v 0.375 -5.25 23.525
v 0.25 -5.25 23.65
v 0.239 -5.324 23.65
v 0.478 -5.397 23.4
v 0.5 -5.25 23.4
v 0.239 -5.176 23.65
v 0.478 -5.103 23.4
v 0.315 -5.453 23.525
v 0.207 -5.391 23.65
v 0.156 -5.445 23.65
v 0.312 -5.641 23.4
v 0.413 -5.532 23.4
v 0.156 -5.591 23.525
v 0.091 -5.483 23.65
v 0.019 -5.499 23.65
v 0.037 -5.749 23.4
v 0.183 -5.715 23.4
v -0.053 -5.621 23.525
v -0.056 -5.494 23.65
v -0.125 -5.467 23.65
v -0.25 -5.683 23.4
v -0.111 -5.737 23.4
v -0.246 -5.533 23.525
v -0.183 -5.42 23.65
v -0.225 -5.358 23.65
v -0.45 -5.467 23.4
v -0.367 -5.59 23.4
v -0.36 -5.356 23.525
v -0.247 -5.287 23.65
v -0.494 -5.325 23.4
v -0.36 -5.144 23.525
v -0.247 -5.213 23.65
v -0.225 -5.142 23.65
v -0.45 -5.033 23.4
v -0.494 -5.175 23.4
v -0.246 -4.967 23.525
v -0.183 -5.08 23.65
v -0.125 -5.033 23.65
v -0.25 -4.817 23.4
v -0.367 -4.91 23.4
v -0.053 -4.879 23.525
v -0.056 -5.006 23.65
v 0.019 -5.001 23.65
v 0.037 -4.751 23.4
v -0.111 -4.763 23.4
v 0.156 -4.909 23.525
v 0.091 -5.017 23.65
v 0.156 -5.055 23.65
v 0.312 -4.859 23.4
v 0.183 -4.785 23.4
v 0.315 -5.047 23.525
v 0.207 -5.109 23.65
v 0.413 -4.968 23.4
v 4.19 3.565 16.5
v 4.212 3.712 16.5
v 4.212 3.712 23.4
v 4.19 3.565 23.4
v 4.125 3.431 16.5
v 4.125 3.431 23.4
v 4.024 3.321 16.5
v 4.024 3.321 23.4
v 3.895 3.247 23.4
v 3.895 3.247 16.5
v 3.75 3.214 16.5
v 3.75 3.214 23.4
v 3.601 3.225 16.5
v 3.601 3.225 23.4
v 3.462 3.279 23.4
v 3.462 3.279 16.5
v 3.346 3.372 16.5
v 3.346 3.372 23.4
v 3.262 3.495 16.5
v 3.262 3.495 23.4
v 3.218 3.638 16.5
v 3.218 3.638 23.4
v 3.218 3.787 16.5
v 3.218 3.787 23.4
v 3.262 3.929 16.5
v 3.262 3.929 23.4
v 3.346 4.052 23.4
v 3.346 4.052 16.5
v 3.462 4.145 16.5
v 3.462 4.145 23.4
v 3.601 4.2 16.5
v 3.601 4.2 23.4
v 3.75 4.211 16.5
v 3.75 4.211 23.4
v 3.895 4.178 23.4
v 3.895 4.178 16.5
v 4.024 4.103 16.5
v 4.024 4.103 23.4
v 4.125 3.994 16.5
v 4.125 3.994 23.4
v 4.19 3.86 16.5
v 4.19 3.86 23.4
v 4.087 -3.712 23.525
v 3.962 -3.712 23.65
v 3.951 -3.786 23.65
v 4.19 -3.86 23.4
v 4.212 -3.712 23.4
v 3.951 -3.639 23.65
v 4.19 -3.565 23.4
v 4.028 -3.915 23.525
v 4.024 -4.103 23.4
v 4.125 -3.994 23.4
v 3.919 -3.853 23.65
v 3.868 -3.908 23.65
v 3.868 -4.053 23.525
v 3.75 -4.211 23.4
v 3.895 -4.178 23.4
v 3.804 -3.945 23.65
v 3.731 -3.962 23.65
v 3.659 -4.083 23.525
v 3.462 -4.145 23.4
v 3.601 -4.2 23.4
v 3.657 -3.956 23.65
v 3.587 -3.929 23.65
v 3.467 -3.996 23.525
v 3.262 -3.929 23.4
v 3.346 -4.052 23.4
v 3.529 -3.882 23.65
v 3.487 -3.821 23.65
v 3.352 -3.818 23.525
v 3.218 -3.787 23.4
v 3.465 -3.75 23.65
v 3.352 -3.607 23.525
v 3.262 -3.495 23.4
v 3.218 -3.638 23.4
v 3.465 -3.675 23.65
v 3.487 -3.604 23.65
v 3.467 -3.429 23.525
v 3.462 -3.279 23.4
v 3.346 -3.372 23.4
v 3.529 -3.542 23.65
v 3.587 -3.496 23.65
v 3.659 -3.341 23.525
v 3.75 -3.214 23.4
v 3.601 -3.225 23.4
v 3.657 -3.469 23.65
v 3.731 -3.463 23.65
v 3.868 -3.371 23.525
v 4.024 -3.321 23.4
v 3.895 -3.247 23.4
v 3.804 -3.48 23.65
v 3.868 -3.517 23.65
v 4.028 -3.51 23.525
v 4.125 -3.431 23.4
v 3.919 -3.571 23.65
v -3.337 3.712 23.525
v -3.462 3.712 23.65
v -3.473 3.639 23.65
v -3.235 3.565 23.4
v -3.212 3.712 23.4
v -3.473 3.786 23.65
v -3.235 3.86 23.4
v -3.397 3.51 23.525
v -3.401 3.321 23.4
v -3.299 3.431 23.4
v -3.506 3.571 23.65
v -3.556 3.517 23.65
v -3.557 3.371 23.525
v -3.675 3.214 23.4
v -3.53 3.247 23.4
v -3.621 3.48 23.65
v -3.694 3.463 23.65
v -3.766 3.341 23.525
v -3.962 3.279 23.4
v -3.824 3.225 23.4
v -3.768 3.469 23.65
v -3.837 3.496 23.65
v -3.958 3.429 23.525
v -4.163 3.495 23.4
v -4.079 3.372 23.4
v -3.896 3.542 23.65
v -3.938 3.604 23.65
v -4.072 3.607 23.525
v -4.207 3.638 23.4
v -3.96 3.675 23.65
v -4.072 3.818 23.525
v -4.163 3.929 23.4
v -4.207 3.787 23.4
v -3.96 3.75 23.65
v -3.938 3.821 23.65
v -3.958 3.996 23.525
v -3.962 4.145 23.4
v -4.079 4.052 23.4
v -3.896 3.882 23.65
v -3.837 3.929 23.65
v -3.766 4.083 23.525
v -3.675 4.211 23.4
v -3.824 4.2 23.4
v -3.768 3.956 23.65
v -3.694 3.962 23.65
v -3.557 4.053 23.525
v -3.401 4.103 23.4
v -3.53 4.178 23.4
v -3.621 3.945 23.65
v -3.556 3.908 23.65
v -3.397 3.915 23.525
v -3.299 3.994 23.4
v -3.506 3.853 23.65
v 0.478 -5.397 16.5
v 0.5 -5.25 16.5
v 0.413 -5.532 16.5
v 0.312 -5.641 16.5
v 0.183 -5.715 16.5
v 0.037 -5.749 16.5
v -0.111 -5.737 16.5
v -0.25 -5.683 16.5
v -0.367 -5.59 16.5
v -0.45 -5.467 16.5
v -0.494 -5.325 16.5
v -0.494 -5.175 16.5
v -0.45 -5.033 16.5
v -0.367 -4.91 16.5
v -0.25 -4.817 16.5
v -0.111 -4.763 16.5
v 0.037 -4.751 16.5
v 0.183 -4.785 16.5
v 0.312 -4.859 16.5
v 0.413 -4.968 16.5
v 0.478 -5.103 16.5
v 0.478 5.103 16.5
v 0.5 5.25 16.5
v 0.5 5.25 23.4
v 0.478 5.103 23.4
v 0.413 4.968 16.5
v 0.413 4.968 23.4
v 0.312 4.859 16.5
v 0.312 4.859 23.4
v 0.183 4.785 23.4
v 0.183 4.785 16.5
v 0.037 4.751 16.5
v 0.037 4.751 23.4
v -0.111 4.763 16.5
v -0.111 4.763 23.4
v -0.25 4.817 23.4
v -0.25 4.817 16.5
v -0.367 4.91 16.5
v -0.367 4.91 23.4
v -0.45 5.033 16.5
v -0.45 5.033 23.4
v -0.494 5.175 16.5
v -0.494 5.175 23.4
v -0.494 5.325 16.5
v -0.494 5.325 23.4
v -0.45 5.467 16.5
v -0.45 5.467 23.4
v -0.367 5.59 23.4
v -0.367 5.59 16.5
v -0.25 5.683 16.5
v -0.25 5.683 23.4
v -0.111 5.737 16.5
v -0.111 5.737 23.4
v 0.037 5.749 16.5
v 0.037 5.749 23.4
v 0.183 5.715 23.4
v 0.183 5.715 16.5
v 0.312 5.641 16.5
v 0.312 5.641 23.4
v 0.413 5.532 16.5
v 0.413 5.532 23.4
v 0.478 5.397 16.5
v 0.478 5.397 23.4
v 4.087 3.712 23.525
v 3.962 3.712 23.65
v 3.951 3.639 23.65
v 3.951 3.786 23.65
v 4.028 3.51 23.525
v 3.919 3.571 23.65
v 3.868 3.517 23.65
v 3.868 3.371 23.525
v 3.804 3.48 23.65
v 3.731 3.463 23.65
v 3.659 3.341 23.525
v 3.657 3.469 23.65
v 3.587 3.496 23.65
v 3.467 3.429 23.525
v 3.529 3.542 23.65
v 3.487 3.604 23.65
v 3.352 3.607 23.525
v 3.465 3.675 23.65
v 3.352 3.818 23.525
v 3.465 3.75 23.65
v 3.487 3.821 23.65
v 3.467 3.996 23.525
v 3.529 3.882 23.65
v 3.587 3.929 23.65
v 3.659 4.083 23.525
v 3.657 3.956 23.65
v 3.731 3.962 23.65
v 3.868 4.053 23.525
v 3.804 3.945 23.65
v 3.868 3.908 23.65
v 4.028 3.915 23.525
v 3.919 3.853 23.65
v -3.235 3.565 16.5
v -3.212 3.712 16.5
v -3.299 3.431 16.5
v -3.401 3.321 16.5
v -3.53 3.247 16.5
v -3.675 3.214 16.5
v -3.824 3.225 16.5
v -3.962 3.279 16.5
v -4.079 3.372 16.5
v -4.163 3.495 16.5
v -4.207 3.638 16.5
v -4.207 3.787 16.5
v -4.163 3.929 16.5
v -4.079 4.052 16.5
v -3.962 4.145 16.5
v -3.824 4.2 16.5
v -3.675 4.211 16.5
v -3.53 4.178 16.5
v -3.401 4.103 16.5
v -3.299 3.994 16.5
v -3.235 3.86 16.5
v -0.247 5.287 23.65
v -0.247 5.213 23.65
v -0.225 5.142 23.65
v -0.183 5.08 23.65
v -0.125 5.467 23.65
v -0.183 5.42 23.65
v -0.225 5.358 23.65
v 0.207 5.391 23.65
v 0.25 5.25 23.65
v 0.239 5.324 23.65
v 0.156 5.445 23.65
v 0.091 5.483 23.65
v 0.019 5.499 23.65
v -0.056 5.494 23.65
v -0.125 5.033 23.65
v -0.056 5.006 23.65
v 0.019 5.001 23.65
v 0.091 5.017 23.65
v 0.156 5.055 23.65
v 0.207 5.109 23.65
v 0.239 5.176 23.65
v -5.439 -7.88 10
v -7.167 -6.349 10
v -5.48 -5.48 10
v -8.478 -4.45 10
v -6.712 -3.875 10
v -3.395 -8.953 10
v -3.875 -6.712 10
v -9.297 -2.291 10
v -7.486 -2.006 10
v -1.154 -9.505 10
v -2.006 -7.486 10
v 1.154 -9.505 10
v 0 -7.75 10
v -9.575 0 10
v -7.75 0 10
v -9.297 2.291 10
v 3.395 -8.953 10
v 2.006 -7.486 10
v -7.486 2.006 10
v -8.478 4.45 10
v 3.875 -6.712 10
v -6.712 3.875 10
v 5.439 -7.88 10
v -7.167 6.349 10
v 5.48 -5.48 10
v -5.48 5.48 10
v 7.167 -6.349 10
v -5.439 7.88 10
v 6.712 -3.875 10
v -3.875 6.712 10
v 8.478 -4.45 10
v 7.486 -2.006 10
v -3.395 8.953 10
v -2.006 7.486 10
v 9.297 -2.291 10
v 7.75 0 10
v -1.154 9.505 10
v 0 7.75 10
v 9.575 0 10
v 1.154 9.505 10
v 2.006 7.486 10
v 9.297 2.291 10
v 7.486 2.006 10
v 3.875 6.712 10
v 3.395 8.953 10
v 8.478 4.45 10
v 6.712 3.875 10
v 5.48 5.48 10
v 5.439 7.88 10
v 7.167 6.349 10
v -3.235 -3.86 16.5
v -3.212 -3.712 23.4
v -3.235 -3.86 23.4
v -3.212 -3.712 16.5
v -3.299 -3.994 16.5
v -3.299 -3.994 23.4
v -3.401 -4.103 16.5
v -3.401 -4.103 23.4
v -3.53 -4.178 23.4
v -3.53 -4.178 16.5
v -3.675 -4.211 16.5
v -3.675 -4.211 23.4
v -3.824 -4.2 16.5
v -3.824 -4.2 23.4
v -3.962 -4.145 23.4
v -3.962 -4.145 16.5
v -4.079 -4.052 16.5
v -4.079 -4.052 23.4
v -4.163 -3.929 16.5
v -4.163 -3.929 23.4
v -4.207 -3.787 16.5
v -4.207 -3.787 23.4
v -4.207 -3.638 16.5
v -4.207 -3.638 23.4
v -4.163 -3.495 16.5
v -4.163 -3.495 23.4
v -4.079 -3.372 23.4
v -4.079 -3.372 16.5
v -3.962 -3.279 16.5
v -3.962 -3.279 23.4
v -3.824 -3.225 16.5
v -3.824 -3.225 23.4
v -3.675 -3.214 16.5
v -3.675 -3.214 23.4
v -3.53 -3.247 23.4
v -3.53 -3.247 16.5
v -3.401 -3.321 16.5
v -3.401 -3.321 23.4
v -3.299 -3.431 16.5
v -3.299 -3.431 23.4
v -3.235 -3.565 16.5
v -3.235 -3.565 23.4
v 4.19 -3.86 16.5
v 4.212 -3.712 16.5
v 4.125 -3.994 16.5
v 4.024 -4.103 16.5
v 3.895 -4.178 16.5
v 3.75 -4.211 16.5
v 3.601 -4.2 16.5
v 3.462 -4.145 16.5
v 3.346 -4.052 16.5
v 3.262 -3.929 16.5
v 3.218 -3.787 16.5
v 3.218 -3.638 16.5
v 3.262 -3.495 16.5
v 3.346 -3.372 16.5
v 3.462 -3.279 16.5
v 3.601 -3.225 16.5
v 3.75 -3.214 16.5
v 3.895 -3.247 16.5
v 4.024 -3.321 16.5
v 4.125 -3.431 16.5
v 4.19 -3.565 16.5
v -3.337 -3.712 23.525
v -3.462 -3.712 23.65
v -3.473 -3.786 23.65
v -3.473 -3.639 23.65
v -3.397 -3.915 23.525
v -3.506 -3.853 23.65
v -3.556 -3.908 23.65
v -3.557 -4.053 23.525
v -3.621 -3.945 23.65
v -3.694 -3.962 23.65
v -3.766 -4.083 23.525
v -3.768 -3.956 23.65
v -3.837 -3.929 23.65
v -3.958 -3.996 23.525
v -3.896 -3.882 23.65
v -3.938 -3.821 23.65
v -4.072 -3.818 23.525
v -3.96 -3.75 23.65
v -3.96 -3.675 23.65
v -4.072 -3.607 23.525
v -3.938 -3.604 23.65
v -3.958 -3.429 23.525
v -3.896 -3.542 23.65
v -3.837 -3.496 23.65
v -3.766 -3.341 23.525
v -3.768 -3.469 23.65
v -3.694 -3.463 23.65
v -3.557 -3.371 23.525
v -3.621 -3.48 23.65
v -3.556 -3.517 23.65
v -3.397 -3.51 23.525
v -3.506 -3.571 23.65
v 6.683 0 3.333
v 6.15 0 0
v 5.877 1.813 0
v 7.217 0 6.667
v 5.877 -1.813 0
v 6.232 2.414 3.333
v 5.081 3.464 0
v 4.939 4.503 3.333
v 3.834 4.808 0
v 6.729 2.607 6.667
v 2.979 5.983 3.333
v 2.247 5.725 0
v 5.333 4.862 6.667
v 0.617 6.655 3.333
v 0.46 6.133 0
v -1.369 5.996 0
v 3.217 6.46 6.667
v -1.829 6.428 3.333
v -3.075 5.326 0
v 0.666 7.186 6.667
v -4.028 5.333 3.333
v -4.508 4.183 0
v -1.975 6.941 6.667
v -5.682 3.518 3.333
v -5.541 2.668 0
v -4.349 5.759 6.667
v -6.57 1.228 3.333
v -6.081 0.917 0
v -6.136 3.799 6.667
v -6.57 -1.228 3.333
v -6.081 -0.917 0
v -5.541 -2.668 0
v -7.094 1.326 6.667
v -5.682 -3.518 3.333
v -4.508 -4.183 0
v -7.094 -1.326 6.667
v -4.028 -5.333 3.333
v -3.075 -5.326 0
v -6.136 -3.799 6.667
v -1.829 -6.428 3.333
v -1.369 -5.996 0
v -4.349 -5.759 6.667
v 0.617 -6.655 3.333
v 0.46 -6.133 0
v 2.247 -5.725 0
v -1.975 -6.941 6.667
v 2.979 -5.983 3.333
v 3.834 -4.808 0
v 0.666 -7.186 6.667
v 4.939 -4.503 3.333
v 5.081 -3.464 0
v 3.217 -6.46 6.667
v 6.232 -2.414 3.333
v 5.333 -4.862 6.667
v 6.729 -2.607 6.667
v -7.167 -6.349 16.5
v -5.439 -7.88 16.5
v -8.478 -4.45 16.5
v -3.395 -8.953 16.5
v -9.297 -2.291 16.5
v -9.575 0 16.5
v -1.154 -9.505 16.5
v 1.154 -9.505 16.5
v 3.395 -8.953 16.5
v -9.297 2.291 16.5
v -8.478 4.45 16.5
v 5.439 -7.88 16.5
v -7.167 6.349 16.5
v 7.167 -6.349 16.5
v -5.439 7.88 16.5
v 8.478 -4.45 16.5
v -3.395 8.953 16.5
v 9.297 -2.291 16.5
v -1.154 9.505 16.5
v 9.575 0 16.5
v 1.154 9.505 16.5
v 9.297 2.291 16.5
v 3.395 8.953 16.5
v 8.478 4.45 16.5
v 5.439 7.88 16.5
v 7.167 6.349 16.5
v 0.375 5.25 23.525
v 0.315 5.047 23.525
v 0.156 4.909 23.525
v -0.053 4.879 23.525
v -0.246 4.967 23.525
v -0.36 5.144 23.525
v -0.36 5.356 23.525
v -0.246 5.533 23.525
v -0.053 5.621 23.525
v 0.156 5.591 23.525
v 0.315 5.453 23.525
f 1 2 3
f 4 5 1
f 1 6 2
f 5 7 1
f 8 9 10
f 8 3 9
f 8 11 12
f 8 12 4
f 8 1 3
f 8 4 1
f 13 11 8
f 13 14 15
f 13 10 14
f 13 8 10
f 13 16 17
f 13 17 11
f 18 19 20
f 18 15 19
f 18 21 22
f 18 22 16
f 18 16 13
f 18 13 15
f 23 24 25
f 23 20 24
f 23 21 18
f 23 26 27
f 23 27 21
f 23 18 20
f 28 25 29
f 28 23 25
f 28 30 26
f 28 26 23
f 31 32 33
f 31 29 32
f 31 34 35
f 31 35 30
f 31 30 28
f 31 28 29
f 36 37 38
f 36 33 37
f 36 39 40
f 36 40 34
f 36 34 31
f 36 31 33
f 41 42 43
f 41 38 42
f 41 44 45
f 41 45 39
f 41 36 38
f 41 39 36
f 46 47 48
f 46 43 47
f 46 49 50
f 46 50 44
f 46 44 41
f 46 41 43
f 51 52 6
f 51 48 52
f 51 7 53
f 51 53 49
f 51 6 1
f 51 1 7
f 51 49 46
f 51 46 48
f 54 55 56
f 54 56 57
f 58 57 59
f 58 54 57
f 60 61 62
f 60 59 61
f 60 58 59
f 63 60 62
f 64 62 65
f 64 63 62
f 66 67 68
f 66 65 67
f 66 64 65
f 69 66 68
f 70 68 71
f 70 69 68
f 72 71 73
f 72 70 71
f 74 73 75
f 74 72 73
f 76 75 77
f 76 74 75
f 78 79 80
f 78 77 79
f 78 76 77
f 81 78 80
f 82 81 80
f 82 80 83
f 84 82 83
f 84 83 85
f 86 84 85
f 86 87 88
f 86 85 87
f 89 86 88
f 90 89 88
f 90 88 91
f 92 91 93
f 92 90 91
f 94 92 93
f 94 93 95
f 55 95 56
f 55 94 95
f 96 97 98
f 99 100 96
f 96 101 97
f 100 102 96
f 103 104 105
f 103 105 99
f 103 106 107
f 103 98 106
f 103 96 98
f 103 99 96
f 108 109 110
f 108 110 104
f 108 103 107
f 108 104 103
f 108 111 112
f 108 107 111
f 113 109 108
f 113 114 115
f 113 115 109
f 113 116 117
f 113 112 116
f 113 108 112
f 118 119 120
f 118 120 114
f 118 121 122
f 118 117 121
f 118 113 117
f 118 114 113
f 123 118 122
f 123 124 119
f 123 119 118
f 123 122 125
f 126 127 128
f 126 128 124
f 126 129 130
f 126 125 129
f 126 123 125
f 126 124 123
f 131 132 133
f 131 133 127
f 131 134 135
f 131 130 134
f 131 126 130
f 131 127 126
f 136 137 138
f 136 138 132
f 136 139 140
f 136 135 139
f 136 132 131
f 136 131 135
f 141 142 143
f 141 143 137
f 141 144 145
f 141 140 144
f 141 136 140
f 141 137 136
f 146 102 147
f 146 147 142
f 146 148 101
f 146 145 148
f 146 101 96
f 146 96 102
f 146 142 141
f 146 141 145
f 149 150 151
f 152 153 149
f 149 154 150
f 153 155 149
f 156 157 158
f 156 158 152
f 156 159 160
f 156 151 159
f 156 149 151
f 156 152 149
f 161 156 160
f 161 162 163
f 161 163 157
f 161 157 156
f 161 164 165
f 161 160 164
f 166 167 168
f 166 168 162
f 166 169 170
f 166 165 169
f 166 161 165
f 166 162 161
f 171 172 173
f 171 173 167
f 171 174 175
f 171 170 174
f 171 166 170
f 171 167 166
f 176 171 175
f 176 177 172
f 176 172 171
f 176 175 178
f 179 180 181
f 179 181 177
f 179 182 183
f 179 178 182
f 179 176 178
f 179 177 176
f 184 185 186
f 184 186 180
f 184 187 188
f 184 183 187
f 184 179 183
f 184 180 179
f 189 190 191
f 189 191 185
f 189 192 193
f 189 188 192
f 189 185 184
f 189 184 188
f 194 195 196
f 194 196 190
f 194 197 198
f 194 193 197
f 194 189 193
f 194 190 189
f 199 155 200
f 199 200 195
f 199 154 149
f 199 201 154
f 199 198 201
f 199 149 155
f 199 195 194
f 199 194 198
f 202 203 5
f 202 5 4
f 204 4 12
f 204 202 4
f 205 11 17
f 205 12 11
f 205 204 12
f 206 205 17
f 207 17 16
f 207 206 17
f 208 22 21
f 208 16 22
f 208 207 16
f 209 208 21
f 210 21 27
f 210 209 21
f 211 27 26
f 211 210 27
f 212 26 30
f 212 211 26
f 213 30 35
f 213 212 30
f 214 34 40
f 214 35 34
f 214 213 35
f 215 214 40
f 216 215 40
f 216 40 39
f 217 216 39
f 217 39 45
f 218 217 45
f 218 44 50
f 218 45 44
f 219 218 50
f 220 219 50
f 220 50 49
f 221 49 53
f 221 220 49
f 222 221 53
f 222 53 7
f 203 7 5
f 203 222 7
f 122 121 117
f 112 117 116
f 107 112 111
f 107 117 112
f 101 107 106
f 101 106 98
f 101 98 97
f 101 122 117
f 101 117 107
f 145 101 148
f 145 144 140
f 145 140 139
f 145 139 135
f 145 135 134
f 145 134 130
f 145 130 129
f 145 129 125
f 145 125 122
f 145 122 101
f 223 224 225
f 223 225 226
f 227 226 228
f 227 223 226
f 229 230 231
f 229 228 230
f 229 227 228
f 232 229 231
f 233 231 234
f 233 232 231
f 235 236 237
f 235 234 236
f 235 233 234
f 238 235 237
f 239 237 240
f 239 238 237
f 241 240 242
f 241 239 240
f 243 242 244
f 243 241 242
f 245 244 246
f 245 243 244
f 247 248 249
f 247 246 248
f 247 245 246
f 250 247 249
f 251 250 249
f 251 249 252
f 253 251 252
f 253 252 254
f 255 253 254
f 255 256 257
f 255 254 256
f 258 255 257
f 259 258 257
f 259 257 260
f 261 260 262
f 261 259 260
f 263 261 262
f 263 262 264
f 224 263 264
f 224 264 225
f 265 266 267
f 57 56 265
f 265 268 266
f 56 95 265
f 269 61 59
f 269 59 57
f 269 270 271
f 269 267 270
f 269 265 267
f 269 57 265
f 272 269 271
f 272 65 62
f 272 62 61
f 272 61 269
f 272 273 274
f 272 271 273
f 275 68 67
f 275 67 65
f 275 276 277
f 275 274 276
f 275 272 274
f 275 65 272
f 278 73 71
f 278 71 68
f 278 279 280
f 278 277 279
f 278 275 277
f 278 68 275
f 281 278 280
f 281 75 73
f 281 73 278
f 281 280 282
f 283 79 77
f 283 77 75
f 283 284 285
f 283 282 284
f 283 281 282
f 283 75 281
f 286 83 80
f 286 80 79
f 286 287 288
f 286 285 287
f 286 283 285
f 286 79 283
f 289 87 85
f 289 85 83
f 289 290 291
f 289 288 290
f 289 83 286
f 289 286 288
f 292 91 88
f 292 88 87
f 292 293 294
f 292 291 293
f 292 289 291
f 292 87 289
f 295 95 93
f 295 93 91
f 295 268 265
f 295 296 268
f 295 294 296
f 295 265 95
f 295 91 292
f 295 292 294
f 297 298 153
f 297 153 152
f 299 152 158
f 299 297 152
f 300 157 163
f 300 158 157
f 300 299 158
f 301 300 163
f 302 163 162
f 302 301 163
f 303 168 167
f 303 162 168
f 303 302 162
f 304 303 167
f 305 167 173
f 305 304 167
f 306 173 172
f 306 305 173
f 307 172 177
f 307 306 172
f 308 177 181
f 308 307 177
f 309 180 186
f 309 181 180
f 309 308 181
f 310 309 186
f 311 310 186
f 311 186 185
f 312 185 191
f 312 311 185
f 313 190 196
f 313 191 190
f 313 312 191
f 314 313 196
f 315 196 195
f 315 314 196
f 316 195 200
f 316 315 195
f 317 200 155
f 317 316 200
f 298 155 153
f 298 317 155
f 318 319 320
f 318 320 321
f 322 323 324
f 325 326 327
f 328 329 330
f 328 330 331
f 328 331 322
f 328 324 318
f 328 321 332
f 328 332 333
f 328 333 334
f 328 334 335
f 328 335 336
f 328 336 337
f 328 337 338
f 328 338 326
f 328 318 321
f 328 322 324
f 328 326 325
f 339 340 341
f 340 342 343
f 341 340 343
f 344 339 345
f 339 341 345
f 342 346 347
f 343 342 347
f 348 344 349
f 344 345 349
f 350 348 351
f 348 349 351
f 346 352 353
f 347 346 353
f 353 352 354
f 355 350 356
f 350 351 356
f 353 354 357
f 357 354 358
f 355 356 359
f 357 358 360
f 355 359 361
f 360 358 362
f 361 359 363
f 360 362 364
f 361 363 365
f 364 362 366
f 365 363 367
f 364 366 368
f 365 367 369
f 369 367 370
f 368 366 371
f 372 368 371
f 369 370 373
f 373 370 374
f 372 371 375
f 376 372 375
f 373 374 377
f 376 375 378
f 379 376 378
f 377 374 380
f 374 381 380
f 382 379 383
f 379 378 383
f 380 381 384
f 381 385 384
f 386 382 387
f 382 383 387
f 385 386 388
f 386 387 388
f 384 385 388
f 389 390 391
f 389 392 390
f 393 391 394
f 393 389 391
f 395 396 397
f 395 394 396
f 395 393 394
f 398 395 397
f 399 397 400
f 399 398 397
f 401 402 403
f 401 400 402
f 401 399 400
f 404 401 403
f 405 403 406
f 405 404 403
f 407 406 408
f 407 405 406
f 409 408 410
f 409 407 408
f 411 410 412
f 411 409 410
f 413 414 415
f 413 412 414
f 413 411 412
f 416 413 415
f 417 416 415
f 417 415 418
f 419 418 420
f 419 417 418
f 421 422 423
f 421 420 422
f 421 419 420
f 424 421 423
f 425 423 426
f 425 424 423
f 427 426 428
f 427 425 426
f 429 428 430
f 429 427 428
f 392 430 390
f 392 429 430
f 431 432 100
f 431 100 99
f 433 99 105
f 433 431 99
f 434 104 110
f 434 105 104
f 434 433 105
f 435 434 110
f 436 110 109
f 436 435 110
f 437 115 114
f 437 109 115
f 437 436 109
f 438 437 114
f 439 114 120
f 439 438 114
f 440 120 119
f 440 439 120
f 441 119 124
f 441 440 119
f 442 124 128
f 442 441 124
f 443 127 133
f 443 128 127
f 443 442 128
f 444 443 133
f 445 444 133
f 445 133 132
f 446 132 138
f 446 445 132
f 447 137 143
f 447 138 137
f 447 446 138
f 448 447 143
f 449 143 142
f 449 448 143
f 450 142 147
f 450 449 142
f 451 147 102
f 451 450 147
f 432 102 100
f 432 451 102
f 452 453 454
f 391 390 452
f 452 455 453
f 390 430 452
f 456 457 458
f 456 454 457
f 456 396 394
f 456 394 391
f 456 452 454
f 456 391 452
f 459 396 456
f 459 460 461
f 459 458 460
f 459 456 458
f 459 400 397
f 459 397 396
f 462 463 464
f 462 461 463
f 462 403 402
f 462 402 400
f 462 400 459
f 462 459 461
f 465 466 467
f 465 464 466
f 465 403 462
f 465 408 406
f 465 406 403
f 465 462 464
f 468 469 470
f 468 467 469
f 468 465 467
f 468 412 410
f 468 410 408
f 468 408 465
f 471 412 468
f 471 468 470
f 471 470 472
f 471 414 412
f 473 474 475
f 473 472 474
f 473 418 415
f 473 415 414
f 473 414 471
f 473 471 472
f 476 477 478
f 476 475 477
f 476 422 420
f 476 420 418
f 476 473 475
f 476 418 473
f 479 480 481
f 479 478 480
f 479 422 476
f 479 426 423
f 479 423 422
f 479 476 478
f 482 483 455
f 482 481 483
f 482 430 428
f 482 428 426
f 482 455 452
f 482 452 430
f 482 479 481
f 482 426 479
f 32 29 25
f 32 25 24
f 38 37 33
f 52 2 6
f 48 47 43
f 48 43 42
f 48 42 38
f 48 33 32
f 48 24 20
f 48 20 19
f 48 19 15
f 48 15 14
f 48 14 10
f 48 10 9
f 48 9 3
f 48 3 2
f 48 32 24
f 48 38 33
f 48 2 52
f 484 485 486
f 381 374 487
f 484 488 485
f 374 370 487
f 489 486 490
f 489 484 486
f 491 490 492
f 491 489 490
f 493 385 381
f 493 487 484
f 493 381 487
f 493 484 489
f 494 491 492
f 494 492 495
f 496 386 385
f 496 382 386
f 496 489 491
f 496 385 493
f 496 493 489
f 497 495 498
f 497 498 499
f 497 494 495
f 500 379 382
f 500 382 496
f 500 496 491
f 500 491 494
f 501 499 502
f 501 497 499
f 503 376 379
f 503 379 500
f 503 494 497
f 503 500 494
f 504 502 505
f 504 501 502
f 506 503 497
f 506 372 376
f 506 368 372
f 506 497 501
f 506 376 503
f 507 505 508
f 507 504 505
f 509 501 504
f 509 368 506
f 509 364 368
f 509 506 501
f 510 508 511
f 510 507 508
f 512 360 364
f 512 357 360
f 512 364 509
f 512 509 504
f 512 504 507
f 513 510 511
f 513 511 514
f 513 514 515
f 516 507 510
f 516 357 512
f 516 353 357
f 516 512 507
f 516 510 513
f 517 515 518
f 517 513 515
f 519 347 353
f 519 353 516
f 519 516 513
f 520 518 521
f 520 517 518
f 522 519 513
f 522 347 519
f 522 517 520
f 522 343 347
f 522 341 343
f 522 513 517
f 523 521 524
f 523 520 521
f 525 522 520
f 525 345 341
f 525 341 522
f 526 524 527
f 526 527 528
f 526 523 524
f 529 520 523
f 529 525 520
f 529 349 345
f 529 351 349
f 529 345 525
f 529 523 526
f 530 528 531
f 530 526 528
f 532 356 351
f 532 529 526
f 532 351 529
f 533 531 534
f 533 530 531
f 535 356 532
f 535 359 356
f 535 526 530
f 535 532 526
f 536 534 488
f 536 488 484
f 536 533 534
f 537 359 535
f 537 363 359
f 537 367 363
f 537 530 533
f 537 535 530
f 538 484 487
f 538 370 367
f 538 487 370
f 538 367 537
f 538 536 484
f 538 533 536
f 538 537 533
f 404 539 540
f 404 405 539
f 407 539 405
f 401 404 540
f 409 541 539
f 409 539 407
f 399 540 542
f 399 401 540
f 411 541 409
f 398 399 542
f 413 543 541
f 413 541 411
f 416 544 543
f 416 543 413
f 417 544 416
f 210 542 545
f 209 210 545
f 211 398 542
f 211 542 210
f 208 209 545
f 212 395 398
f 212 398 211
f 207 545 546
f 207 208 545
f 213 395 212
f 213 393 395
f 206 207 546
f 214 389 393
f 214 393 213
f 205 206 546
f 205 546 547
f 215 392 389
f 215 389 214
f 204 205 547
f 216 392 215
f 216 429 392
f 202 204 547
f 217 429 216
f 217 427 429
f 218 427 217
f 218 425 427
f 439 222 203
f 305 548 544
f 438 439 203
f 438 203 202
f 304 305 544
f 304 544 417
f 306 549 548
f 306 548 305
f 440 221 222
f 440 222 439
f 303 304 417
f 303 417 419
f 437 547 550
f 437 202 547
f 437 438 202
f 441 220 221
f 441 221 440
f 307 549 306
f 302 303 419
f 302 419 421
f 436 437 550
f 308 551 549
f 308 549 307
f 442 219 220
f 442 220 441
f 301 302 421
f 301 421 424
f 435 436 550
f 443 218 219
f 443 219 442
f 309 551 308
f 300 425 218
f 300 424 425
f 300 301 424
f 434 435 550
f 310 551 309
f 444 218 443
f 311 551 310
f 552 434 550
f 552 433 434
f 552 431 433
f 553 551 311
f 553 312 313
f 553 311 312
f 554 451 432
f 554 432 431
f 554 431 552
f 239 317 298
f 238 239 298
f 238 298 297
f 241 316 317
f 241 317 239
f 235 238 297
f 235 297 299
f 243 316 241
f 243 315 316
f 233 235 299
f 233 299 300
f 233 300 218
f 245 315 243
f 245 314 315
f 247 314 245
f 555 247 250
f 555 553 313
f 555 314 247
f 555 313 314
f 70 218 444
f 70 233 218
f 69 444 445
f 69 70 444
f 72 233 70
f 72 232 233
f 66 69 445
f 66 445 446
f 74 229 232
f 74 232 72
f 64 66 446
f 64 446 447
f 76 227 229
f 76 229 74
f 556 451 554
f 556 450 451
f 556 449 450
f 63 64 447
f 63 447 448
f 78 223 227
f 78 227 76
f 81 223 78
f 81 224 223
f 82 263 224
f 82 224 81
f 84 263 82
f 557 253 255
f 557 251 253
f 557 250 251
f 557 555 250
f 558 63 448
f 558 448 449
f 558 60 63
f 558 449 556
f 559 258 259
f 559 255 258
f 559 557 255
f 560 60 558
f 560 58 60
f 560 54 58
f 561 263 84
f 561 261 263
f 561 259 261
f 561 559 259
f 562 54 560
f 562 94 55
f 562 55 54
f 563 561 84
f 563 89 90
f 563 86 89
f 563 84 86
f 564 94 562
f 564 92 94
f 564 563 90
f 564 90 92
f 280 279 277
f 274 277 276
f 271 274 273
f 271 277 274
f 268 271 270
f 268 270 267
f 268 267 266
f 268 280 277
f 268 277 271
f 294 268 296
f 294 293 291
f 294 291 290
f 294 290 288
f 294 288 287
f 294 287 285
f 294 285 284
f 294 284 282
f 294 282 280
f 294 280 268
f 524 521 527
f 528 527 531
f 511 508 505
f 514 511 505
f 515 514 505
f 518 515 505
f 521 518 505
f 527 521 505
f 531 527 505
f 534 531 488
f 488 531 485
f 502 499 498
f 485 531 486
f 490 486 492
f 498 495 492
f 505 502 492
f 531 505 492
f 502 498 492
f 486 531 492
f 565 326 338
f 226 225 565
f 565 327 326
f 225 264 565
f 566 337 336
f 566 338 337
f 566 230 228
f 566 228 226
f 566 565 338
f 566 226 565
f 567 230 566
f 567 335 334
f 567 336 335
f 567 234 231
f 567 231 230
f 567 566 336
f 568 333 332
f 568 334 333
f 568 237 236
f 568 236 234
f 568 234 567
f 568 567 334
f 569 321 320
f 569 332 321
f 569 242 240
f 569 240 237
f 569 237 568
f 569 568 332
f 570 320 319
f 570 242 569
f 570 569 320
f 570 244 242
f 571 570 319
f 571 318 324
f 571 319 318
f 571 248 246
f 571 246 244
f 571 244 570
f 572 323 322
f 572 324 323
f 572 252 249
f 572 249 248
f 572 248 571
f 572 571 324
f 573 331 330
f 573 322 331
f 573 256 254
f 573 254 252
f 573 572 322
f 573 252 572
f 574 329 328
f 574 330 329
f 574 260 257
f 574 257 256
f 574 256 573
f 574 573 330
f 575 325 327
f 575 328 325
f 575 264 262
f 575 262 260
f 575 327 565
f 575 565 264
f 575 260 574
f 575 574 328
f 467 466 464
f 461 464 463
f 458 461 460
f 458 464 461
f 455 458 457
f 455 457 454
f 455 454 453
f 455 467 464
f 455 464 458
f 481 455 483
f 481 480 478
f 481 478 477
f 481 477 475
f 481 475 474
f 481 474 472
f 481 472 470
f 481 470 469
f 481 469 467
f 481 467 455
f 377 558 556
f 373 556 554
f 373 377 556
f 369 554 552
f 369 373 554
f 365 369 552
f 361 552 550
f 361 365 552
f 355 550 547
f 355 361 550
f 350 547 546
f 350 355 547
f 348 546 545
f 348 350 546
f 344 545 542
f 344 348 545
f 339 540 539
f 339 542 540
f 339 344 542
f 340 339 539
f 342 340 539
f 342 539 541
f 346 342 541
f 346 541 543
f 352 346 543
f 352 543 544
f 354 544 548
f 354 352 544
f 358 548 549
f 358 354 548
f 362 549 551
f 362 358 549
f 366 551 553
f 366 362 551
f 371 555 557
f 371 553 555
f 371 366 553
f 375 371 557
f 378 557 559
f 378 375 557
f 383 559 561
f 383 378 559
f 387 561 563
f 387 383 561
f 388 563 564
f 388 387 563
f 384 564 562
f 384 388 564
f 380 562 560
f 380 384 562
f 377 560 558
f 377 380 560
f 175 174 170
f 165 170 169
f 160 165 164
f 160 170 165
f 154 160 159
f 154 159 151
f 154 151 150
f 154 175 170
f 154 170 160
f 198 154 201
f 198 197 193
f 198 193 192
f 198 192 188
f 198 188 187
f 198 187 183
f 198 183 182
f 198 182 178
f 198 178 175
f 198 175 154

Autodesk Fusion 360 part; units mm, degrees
sketch "Sketch1" plane through (0, 0, 0) normal (0, 0, 1) x (1, 0, 0)
  circle A0 centre (0, 0) radius 6.15
  dimension "d1" = 12.3
ref_plane "WorkPlane1" through (0, 0, 10) normal (0, 0, 1) x (1, 0, 0)
sketch "Sketch2" plane through (0, 0, 10) normal (0, 0, 1) x (1, 0, 0)
  circle A0 centre (0, 0) radius 7.75
  dimension "d3" = 15.5
loft "Loft1" add profiles "Sketch2", "Sketch1" section 1 section 2
sketch "Sketch3" plane through (0, 0, 10) normal (0, 0, 1) x (1, 0, 0)
  circle A0 centre (0, 0) radius 7.75
  circle A1 centre (0, 0) radius 9.575
  dimension "d4" = 19.15
extrude "Extrude1" add sketch "Sketch3" along normal blind 6.5 contours A0 | A1
sketch "Sketch4" plane through (0, 0, 16.5) normal (0, 0, 1) x (1, 0, 0)
  circle A0 centre (0, 0) radius 9.575
  circle A1 centre (0, 0) radius 5.25 construction
  line L0 (0, 5.25) -> (0, -5.25) construction
  circle A2 centre (0, 5.25) radius 0.5
  circle A3 centre (-3.7123, 3.7123) radius 0.5
  circle A4 centre (-3.7123, -3.7123) radius 0.5
  circle A5 centre (0, -5.25) radius 0.5
  circle A6 centre (3.7123, -3.7123) radius 0.5
  circle A7 centre (3.7123, 3.7123) radius 0.5
  dimension "d7" = 10.5
  dimension "d8" = 1
  dimension "d10" = 360
extrude "Extrude2" add sketch "Sketch4" along normal blind 7.15 contours A2 | A3 | A4 | A5 | A6 | A7
chamfer "Chamfer1" distance 0.25 angle 45 6 edges at (3.2461, 3.5315, 23.65) (-0.4662, 5.0692, 23.65) (-4.1785, 3.5315, 23.65) (-4.1785, -3.8931, 23.65) (-0.4662, -5.4308, 23.65) (3.2461, -3.8931, 23.65)
